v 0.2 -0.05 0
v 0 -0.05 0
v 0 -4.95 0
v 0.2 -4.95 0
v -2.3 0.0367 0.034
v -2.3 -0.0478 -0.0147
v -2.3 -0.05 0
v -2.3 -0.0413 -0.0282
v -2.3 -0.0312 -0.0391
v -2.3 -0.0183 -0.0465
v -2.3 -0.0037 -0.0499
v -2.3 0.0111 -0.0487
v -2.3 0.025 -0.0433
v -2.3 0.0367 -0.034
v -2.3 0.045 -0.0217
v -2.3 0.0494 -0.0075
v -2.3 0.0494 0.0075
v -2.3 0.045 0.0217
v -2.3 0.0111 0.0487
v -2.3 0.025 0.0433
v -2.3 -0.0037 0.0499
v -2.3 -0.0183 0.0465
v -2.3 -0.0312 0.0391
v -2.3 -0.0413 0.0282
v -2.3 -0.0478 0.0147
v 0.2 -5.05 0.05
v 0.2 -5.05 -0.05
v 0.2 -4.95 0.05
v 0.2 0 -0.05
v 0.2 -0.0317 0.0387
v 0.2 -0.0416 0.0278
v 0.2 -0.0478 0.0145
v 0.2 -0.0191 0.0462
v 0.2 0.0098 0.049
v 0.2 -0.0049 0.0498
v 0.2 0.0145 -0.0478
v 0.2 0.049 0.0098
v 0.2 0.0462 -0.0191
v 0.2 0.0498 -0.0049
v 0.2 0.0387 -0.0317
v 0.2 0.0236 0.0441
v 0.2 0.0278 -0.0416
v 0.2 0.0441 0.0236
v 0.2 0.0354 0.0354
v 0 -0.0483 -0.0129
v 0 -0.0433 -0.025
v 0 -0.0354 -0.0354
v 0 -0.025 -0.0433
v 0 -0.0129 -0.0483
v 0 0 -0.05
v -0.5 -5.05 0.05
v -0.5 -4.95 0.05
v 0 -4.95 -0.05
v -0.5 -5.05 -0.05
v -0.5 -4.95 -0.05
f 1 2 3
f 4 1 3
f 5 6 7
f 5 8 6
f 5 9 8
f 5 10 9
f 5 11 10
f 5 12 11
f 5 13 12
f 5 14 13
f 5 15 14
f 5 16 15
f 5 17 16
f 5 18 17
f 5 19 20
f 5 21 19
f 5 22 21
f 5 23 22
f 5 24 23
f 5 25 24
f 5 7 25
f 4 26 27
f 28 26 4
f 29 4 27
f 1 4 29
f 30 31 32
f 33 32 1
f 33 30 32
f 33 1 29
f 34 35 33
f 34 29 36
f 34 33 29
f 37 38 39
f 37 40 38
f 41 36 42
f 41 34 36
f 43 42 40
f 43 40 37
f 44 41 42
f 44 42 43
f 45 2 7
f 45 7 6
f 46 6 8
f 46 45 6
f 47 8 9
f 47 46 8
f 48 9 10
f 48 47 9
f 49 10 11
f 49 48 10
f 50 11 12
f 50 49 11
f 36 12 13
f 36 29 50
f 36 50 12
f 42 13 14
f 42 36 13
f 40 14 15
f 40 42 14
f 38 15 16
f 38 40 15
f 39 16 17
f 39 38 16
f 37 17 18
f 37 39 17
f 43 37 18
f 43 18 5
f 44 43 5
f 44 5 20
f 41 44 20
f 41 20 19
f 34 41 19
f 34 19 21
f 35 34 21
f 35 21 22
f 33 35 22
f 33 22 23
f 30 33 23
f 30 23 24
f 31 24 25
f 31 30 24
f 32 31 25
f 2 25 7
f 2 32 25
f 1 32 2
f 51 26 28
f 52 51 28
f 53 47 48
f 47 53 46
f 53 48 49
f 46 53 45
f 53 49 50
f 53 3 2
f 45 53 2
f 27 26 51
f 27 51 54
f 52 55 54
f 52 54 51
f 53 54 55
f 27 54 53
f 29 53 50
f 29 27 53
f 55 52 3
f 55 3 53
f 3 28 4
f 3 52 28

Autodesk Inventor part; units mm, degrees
ref_plane "YZ Plane" through (0, 0, 0) normal (1, 0, 0) x (0, 1, 0)
ref_plane "XZ Plane" through (0, 0, 0) normal (0, 1, 0) x (-1, 0, 0)
ref_plane "XY Plane" through (0, 0, 0) normal (0, 0, 1) x (1, 0, 0)
sketch "Sketch1" plane through (0, 0, 0) normal (1, 0, 0) x (0, 1, 0)
  circle A0 centre (0, 0) radius 0.05
  line L0 (0, 0) -> (-5, 0)
  line L1 (-5.05, 0.05) -> (-4.95, 0.05)
  line L2 (-4.95, 0.05) -> (-4.95, -0.05)
  line L3 (-4.95, -0.05) -> (-5.05, -0.05)
  line L4 (-5.05, -0.05) -> (-5.05, 0.05)
  line L5 (-5.05, 0.05) -> (-4.95, -0.05) construction
  line L6 (-4.95, 0.05) -> (-5.05, -0.05) construction
  line L7 (-4.95, -0.05) -> (0, -0.05)
  point P0 (-0.05, 0)
  point P1 (-4.95, 0)
  dimension "d0" = 0.1
  dimension "d1" = 5
  dimension "d2" = 0.1
  dimension "d3" = 0.1
extrude "Extrusion1" add sketch "Sketch1" along normal blind 0.2
sketch "Sketch2" plane through (0, 0, 0) normal (-1, 0, 0) x (0, 0, 1)
  arc A0 (0, -0.05) -> (-0.05, 0) centre (0, 0) ccw projected
  circle A1 centre (0, 0) radius 0.05
  point P0 (-0.05, 0)
  point P1 (0, -0.05)
  dimension "d6" = 0.1
extrude "Extrusion2" add sketch "Sketch2" along normal blind 2.3
sketch "Sketch3" plane through (0, 0, 0) normal (-1, 0, 0) x (0, 0, 1)
  line L0 (-0.05, -5.05) -> (-0.05, 0) projected
  line L1 (0.05, -5.05) -> (-0.05, -5.05) projected
  line L2 (-0.05, -5.05) -> (0.05, -5.05)
  line L3 (0, -4.95) -> (0.05, -4.95) projected
  line L4 (0.05, -5.05) -> (0.05, -4.95)
  line L5 (0.05, -4.95) -> (-0.05, -4.95)
  line L6 (-0.05, -4.95) -> (-0.05, -5.05)
  point P0 (0, 0)
extrude "Extrusion3" add sketch "Sketch3" along normal blind 0.5
properties part number "Bone27_26_Fix"
